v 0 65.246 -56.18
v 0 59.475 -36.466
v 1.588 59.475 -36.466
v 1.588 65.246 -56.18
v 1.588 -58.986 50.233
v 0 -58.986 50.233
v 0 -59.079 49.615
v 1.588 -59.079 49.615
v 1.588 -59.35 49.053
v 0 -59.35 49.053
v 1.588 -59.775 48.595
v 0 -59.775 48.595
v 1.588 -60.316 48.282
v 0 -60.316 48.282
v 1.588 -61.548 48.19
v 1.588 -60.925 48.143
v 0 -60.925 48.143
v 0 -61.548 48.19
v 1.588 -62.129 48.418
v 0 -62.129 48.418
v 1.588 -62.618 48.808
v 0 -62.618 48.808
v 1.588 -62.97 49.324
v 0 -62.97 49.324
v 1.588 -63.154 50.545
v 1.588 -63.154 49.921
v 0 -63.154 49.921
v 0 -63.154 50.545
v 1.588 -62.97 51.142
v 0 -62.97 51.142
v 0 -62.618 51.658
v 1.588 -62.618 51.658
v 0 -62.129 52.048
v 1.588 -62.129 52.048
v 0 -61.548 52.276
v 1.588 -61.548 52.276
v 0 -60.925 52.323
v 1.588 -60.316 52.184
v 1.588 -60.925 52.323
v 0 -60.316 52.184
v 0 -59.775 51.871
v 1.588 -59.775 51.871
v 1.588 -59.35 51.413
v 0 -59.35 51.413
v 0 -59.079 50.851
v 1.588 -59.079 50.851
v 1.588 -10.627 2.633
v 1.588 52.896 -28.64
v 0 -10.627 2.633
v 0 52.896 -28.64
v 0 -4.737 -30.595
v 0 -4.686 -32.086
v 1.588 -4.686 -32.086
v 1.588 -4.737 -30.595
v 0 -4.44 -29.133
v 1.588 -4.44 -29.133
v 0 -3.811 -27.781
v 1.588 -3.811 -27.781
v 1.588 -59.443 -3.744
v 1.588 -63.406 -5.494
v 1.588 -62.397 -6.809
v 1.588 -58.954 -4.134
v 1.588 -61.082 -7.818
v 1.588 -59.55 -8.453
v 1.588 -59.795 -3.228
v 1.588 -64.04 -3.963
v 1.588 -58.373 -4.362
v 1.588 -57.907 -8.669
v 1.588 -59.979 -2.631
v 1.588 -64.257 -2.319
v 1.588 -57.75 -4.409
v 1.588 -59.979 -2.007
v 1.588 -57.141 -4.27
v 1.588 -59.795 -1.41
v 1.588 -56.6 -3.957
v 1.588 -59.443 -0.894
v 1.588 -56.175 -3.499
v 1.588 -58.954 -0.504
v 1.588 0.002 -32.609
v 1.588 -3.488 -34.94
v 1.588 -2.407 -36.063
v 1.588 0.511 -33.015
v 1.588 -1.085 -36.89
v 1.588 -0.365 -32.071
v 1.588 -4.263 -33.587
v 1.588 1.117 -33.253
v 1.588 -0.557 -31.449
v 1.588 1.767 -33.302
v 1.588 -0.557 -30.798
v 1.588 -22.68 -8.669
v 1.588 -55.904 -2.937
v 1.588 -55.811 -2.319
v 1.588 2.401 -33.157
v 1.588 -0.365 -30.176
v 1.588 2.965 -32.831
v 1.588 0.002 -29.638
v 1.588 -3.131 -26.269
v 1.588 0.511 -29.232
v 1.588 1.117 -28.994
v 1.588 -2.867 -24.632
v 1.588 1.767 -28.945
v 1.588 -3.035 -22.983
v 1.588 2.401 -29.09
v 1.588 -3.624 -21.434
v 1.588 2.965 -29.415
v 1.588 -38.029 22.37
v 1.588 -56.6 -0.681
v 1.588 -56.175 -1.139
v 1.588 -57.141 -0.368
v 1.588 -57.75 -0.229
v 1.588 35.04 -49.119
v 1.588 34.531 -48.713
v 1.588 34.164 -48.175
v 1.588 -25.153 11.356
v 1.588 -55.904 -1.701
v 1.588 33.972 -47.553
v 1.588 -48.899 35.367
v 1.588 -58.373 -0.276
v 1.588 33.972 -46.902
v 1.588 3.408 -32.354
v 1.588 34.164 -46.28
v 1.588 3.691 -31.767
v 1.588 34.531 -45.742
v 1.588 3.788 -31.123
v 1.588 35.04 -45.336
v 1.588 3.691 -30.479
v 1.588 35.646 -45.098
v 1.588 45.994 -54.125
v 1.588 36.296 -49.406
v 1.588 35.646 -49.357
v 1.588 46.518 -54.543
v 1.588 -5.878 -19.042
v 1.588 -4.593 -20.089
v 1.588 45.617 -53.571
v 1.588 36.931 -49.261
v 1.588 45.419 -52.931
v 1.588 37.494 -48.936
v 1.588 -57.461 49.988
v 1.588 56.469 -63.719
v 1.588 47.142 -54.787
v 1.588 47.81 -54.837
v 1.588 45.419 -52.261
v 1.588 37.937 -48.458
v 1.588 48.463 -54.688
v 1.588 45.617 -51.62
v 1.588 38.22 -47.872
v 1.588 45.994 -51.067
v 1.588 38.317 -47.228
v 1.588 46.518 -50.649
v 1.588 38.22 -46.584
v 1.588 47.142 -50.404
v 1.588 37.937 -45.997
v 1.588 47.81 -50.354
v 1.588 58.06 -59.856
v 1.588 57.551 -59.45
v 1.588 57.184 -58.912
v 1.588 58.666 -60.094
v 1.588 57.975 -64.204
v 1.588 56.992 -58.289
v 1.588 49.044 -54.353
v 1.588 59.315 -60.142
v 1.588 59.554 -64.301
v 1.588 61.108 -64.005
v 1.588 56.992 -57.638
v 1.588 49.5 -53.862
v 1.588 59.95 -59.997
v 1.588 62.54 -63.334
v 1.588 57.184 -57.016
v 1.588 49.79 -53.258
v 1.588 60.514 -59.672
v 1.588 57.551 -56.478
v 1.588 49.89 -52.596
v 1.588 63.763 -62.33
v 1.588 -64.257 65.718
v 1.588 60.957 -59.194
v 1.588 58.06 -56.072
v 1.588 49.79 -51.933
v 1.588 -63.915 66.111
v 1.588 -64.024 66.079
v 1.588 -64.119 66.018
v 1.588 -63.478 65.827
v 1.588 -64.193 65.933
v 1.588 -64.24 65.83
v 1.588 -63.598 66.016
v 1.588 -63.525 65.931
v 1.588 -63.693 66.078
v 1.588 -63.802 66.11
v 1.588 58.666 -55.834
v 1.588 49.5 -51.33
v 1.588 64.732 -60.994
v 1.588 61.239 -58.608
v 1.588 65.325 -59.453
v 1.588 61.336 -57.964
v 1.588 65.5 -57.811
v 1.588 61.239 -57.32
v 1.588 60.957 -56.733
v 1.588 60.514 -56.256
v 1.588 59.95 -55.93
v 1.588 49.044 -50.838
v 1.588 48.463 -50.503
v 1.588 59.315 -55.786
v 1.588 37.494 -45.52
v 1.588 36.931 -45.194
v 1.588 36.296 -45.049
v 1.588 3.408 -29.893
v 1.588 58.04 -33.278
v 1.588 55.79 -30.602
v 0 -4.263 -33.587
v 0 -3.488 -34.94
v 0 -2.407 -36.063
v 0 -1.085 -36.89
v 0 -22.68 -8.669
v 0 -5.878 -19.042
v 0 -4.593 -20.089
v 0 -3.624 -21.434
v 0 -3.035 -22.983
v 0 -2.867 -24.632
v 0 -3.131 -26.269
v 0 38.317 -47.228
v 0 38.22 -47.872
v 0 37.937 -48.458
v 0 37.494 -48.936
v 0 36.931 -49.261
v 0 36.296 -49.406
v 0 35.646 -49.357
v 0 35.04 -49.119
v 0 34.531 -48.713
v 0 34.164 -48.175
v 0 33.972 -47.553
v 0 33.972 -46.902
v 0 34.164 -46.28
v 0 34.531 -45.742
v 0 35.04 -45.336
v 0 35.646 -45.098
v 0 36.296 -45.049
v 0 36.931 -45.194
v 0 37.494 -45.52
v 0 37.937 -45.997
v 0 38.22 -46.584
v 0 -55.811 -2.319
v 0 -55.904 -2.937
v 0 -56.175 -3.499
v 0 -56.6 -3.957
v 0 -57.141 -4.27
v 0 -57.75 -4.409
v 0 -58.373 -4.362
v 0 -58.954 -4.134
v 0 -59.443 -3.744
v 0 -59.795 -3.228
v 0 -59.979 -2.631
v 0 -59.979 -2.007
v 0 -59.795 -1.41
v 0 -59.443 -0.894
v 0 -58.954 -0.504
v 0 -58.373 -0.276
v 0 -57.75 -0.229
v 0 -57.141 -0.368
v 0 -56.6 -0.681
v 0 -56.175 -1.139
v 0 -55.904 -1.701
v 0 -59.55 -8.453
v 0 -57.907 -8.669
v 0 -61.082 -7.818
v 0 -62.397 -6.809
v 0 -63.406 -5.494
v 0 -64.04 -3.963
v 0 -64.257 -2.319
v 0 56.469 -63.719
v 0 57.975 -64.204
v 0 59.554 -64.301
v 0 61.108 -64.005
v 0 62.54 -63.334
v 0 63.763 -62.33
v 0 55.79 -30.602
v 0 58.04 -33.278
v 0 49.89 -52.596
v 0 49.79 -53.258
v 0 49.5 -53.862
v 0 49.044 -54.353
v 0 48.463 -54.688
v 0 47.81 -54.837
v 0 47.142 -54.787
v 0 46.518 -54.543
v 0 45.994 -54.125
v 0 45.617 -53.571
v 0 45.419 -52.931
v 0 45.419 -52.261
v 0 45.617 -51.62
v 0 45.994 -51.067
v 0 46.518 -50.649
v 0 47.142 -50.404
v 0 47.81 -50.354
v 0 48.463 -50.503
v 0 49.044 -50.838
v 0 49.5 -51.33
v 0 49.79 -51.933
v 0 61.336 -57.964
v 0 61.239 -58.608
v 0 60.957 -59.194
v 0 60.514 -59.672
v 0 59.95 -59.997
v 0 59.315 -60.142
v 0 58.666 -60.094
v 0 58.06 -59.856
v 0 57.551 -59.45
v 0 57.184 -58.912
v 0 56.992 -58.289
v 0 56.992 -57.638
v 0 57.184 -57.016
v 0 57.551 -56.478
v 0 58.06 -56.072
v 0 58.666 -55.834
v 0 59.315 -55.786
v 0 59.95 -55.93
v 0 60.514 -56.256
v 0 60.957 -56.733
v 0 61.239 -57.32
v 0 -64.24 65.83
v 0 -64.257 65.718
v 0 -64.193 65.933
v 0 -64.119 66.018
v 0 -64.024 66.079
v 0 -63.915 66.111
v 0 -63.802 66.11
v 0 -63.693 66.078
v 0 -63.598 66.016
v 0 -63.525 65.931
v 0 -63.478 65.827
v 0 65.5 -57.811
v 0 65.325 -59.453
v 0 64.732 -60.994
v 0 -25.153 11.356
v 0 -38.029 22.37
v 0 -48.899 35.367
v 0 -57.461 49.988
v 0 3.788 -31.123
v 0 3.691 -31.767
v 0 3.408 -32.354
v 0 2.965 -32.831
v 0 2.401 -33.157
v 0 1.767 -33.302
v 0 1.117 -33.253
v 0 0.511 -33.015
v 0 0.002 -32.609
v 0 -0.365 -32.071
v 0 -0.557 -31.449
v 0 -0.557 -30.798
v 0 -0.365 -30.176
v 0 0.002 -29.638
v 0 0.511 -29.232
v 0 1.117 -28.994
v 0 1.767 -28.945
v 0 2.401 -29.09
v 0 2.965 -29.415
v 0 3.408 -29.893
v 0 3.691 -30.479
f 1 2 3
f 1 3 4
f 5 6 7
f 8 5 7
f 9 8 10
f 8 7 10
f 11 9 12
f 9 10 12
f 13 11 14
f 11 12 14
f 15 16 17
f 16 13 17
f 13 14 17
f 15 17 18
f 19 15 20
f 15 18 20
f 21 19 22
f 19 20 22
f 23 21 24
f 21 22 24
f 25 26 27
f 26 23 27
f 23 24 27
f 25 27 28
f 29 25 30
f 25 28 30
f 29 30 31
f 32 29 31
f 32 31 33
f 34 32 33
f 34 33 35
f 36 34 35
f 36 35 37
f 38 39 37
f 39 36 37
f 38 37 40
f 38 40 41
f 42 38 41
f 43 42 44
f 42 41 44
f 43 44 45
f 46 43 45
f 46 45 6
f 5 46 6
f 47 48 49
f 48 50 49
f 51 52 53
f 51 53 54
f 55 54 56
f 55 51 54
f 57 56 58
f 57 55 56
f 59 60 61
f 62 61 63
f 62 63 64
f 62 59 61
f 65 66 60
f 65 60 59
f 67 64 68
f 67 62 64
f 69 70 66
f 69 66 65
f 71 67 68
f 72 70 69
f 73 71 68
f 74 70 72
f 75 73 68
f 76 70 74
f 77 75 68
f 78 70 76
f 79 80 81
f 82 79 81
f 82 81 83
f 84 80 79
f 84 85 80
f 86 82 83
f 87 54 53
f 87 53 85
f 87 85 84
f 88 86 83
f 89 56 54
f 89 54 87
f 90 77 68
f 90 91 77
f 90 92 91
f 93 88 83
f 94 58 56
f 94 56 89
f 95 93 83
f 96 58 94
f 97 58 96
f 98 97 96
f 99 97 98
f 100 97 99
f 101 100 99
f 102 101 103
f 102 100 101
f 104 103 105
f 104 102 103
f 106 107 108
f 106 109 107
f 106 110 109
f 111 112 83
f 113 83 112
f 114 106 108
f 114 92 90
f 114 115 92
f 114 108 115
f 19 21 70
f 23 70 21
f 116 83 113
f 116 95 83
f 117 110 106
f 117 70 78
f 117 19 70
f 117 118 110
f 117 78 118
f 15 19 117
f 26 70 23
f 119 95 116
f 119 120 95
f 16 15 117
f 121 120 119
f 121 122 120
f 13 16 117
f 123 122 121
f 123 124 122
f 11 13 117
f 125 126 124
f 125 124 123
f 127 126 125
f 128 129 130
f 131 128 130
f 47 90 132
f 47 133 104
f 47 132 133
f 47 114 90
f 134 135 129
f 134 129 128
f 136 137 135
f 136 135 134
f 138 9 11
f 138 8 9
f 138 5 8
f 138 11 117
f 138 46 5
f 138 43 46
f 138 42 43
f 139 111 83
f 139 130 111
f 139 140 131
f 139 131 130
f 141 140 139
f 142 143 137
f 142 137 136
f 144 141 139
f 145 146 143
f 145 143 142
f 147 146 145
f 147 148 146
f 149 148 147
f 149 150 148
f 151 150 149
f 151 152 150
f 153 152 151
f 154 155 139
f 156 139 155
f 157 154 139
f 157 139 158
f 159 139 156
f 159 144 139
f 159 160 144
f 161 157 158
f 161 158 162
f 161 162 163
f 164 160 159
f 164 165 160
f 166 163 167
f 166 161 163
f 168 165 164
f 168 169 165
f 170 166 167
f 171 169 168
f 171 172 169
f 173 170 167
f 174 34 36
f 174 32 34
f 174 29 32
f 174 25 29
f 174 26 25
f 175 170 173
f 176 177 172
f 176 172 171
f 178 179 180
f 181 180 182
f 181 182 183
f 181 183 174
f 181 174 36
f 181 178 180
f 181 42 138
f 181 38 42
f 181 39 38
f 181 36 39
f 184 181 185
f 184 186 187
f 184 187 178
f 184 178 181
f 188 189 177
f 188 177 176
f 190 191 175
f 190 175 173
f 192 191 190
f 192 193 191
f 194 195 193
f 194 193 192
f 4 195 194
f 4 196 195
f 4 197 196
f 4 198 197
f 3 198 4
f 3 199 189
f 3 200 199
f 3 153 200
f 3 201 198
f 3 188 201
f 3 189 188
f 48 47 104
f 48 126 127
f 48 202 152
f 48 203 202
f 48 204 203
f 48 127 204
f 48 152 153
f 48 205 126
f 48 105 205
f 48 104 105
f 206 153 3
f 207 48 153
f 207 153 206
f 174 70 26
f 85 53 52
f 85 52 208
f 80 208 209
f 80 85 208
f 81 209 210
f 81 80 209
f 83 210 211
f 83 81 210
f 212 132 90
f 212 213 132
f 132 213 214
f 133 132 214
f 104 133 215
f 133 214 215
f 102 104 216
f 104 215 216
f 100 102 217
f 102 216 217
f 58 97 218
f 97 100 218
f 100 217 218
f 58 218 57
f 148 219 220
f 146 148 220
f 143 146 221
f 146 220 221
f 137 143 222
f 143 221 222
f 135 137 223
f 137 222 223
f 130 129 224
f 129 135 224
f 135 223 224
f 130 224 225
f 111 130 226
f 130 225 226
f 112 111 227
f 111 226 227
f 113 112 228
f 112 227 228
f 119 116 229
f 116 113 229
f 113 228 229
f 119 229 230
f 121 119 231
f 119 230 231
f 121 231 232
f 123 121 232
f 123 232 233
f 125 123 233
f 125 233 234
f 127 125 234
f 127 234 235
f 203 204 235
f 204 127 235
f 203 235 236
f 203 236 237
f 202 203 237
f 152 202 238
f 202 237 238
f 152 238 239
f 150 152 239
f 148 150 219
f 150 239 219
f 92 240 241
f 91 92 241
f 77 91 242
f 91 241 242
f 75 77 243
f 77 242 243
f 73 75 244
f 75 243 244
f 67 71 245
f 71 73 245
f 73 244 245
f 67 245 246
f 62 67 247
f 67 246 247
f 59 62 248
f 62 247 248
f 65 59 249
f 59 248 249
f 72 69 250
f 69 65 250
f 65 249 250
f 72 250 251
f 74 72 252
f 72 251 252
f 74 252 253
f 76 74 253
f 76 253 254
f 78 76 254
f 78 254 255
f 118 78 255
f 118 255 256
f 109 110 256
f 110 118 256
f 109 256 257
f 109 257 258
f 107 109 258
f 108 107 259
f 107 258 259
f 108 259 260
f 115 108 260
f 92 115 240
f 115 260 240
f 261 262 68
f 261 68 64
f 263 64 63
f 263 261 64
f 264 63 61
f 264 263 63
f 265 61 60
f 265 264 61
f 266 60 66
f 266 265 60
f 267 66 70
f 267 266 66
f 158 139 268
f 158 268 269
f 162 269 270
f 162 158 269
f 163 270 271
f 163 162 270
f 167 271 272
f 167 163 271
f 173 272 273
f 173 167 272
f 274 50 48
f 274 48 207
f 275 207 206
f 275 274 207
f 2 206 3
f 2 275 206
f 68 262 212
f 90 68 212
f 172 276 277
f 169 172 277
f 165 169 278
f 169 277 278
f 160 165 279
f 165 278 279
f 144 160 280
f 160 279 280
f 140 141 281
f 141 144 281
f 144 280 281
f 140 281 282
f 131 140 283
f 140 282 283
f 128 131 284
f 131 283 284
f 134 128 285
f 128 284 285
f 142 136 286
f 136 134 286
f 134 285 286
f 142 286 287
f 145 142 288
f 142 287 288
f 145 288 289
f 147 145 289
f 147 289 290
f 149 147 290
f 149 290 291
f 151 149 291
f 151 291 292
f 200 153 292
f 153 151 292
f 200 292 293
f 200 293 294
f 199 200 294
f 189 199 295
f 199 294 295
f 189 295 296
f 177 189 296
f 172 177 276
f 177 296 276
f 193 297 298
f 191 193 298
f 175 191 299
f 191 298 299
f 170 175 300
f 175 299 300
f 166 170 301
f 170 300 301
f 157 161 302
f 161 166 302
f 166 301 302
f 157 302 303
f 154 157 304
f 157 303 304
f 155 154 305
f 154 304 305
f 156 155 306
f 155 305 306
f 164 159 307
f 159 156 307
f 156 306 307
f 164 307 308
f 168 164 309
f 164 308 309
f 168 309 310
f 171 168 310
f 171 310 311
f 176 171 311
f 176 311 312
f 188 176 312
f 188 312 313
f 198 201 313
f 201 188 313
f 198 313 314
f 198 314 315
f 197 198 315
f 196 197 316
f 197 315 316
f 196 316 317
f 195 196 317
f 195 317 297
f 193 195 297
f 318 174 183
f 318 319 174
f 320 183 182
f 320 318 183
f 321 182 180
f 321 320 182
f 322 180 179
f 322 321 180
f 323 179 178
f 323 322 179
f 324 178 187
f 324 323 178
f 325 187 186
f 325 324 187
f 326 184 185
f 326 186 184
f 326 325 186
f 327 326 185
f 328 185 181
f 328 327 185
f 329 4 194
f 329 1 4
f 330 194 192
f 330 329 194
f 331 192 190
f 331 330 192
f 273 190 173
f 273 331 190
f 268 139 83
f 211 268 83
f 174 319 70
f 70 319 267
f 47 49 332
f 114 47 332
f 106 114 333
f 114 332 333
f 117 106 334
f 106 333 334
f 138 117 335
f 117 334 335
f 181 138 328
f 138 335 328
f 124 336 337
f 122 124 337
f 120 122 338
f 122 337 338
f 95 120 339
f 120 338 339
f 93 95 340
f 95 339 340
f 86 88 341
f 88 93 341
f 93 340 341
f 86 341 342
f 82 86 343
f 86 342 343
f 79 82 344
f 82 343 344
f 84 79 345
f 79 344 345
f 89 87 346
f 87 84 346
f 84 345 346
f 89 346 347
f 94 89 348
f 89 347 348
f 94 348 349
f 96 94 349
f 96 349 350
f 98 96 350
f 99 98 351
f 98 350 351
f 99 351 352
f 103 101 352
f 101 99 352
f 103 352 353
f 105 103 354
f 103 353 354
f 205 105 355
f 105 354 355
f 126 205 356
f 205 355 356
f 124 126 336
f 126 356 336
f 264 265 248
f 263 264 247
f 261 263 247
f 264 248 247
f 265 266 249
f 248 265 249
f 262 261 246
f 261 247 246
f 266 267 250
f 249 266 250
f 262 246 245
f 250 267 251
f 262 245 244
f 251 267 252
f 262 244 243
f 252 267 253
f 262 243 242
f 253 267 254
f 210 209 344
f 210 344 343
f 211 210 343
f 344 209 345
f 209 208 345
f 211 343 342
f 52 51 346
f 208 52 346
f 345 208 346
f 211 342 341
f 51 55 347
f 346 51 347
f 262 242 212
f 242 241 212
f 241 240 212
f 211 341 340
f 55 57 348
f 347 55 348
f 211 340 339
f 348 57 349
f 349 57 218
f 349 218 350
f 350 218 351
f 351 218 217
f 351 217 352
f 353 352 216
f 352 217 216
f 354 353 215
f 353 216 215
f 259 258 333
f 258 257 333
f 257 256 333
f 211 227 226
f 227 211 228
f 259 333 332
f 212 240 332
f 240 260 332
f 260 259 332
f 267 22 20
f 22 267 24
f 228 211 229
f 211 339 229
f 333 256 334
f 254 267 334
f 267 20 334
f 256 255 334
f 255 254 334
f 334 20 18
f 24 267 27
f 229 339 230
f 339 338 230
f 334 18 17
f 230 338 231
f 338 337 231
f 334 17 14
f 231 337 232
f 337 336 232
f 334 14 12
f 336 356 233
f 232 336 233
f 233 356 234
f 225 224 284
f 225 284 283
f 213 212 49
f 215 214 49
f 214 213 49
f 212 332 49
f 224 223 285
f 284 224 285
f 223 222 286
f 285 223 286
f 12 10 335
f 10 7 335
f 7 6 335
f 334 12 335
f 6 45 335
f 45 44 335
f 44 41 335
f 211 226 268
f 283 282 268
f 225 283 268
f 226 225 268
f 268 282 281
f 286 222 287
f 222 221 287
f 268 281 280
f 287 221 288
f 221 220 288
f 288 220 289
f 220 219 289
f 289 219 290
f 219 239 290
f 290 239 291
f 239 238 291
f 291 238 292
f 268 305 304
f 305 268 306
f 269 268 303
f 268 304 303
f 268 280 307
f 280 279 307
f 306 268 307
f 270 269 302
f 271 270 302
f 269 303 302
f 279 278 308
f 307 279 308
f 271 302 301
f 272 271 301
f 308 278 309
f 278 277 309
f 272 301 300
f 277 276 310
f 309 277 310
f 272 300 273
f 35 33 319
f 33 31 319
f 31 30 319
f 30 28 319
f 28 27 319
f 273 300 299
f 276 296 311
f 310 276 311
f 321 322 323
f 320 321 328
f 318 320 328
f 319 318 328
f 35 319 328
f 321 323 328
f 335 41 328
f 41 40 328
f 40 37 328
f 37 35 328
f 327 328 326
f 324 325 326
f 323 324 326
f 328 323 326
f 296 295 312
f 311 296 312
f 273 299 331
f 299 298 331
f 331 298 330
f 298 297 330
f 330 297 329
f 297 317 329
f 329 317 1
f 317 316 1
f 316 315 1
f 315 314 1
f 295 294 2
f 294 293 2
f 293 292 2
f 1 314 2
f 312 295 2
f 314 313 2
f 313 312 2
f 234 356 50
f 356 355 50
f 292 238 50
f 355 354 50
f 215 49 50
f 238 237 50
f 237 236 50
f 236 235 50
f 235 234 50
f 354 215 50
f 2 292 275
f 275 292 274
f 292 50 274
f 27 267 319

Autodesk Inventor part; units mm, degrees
ref_plane "YZ Plane" through (0, 0, 0) normal (1, 0, 0) x (0, 1, 0)
ref_plane "XZ Plane" through (0, 0, 0) normal (0, 1, 0) x (-1, 0, 0)
ref_plane "XY Plane" through (0, 0, 0) normal (0, 0, 1) x (1, 0, 0)
sketch "main" plane through (0, 0, 0) normal (0, 0, 1) x (1, 0, 0)
  circle A0 centre (31.5379, -87.1249) radius 2.0955
  circle A1 centre (8.5185, -76.3887) radius 2.0955
  line L0 (52.8956, -28.6403) -> (-10.6273, 2.6327)
  circle A2 centre (1.6034, -31.1233) radius 2.1844
  arc A3 (-63.4783, 65.8273) -> (-10.6273, 2.6327) centre (34.3111, 93.9132) ccw
  line L1 (-57.9066, -8.669) -> (-22.6804, -8.669)
  circle A4 centre (59.152, -57.9639) radius 2.1844
  line L2 (59.4746, -36.466) -> (65.2461, -56.1797)
  arc A5 (63.7627, -62.3301) -> (65.2461, -56.1797) centre (59.152, -57.9639) ccw
  line L3 (-64.2566, 65.7178) -> (-64.2566, -2.319)
  line L4 (-64.2566, 68.6882) -> (6.9552, 68.6882) construction
  arc A6 (-64.2566, -2.319) -> (-57.9066, -8.669) centre (-57.9066, -2.319) ccw
  circle A7 centre (20.0282, -81.7568) radius 2.0955
  arc A8 (28.8539, -92.8798) -> (36.1487, -91.4911) centre (31.5379, -87.1249) ccw
  line L5 (28.8539, -92.8798) -> (5.8344, -82.1435)
  line L6 (36.1487, -91.4911) -> (63.7627, -62.3301)
  circle A9 centre (47.6422, -52.5958) radius 2.2479
  arc A10 (-63.4783, 65.8273) -> (-64.2566, 65.7178) centre (-63.8597, 65.7178) ccw
  arc A11 (59.4746, -36.466) -> (52.8956, -28.6403) centre (47.2862, -40.0344) ccw
  circle A12 centre (36.1325, -47.2277) radius 2.1844
  arc A13 (-3.8107, -27.7809) -> (-4.6861, -32.0859) centre (1.6034, -31.1233) ccw
  line L7 (-3.8107, -27.7809) -> (-3.8107, -27.7809)
  line L8 (-5.8782, -19.0419) -> (-22.6804, -8.669)
  arc A14 (-3.8107, -27.7809) -> (-5.8782, -19.0419) centre (-9.2139, -24.4452) ccw
  circle A15 centre (-61.0816, 50.233) radius 2.0955
  circle A16 centre (-57.9066, -2.319) radius 2.0955
  arc A17 (2.2416, -77.3494) -> (5.8344, -82.1435) centre (8.5185, -76.3887) ccw
  line L9 (2.2416, -77.3494) -> (-4.6861, -32.0859)
  point P0 (22.7298, -27.8341)
  point P1 (-67.4316, 93.9132)
  point P2 (-64.2566, -8.669)
  point P3 (57.9062, -31.1089)
  point P4 (57.9062, -31.1089)
  point P5 (-0.4749, -22.3776)
  point P6 (-1.0693, -36.8975)
  dimension "d4" = 12.7
  dimension "d5" = 4.191
  dimension "d6" = 25.4
  dimension "d10" = 6.35
  dimension "d11" = 4.191
  dimension "d12" = 12.7
  dimension "d14" = 4.4958
  dimension "d23" = 0.3969
  dimension "d25" = 12.7
  dimension "d26" = 12.7
  dimension "d27" = 4.3688
  dimension "d28" = 6.35
  dimension "d29" = 6.35
  dimension "d31" = 4.191
  dimension "d33" = 4.191
  dimension "d35" = 12.7
  dimension "d36" = 12.7
  dimension "d37" = 38.1
  dimension "d38" = 12.7
sketch "Sketch1" plane through (0, 0, 0) normal (1, 0, 0) x (0, 1, 0)
  circle A0 centre (31.5379, -87.1249) radius 2.0955
  circle A1 centre (8.5185, -76.3887) radius 2.0955
  line L0 (52.8956, -28.6403) -> (-10.6273, 2.6327)
  circle A2 centre (1.6034, -31.1233) radius 2.1844
  arc A3 (-63.4783, 65.8273) -> (-10.6273, 2.6327) centre (34.3111, 93.9132) ccw
  line L1 (-57.9066, -8.669) -> (-22.6804, -8.669)
  circle A4 centre (59.152, -57.9639) radius 2.1844
  line L2 (59.4746, -36.466) -> (65.2461, -56.1797)
  arc A5 (63.7627, -62.3301) -> (65.2461, -56.1797) centre (59.152, -57.9639) ccw
  line L3 (-64.2566, 65.7178) -> (-64.2566, -2.319)
  line L4 (-64.2566, 68.6882) -> (6.9552, 68.6882) construction
  arc A6 (-64.2566, -2.319) -> (-57.9066, -8.669) centre (-57.9066, -2.319) ccw
  circle A7 centre (20.0282, -81.7568) radius 2.0955
  arc A8 (28.8539, -92.8798) -> (36.1487, -91.4911) centre (31.5379, -87.1249) ccw
  line L5 (28.8539, -92.8798) -> (5.8344, -82.1435)
  line L6 (36.1487, -91.4911) -> (63.7627, -62.3301)
  circle A9 centre (47.6422, -52.5958) radius 2.2479
  arc A10 (-63.4783, 65.8273) -> (-64.2566, 65.7178) centre (-63.8597, 65.7178) ccw
  arc A11 (59.4746, -36.466) -> (52.8956, -28.6403) centre (47.2862, -40.0344) ccw
  circle A12 centre (36.1325, -47.2277) radius 2.1844
  arc A13 (-3.8107, -27.7809) -> (-4.6861, -32.0859) centre (1.6034, -31.1233) ccw
  line L7 (-3.8107, -27.7809) -> (-3.8107, -27.7809)
  line L8 (-5.8782, -19.0419) -> (-22.6804, -8.669)
  arc A14 (-3.8107, -27.7809) -> (-5.8782, -19.0419) centre (-9.2139, -24.4452) ccw
  circle A15 centre (-61.0816, 50.233) radius 2.0955
  circle A16 centre (-57.9066, -2.319) radius 2.0955
  arc A17 (2.2416, -77.3494) -> (5.8344, -82.1435) centre (8.5185, -76.3887) ccw
  line L9 (2.2416, -77.3494) -> (-4.6861, -32.0859)
  point P0 (0, 0)
extrude "Extrusion2" add sketch "Sketch1" along normal blind 1.5875
sketch "Sketch2" plane through (1.5875, 0, 0) normal (1, 0, 0) x (0, 0, -1)
  line L0 (82.1435, 5.8344) -> (92.8798, 28.8539) projected
  arc A0 (77.3494, 2.2416) -> (82.1435, 5.8344) centre (76.3887, 8.5185) ccw projected
  line L1 (91.4911, 36.1487) -> (62.3301, 63.7627) projected
  arc A1 (92.8798, 28.8539) -> (91.4911, 36.1487) centre (87.1249, 31.5379) ccw projected
  circle A2 centre (57.9639, 59.152) radius 2.1844 projected
  arc A3 (63.7193, 56.469) -> (62.3301, 63.7627) centre (57.9639, 59.152) ccw
  circle A4 centre (31.1233, 1.6034) radius 2.1844 projected
  arc A5 (32.0859, -4.6861) -> (36.8902, -1.0849) centre (31.1233, 1.6034) ccw
  line L2 (63.7193, 56.469) -> (36.8902, -1.0849)
  line L3 (32.0859, -4.6861) -> (77.3494, 2.2416) projected
  point P0 (0, 0)
extrude "Extrusion3" cut sketch "Sketch2" against normal blind 25.4 contours A0 L3 A5 L2 A3 L1 A1 L0
equation "\"BendRadius\" = Thickness"
equation "\"BendReliefWidth\" = Thickness"
equation "\"BendReliefDepth\" = 0.5 * Thickness"
equation "\"CornerReliefSize\" = 4 * Thickness"
equation "\"MinimumRemnant\" = 2 * Thickness"
equation "\"TransitionRadius\" = BendRadius"
equation "\"JacobiRadiusSize\" = BendRadius"
equation "\"GapSize\" = Thickness"
equation "\"Thickness\" = 1.5875"
properties part number "Ramp" material "Acetal Resin, White"
